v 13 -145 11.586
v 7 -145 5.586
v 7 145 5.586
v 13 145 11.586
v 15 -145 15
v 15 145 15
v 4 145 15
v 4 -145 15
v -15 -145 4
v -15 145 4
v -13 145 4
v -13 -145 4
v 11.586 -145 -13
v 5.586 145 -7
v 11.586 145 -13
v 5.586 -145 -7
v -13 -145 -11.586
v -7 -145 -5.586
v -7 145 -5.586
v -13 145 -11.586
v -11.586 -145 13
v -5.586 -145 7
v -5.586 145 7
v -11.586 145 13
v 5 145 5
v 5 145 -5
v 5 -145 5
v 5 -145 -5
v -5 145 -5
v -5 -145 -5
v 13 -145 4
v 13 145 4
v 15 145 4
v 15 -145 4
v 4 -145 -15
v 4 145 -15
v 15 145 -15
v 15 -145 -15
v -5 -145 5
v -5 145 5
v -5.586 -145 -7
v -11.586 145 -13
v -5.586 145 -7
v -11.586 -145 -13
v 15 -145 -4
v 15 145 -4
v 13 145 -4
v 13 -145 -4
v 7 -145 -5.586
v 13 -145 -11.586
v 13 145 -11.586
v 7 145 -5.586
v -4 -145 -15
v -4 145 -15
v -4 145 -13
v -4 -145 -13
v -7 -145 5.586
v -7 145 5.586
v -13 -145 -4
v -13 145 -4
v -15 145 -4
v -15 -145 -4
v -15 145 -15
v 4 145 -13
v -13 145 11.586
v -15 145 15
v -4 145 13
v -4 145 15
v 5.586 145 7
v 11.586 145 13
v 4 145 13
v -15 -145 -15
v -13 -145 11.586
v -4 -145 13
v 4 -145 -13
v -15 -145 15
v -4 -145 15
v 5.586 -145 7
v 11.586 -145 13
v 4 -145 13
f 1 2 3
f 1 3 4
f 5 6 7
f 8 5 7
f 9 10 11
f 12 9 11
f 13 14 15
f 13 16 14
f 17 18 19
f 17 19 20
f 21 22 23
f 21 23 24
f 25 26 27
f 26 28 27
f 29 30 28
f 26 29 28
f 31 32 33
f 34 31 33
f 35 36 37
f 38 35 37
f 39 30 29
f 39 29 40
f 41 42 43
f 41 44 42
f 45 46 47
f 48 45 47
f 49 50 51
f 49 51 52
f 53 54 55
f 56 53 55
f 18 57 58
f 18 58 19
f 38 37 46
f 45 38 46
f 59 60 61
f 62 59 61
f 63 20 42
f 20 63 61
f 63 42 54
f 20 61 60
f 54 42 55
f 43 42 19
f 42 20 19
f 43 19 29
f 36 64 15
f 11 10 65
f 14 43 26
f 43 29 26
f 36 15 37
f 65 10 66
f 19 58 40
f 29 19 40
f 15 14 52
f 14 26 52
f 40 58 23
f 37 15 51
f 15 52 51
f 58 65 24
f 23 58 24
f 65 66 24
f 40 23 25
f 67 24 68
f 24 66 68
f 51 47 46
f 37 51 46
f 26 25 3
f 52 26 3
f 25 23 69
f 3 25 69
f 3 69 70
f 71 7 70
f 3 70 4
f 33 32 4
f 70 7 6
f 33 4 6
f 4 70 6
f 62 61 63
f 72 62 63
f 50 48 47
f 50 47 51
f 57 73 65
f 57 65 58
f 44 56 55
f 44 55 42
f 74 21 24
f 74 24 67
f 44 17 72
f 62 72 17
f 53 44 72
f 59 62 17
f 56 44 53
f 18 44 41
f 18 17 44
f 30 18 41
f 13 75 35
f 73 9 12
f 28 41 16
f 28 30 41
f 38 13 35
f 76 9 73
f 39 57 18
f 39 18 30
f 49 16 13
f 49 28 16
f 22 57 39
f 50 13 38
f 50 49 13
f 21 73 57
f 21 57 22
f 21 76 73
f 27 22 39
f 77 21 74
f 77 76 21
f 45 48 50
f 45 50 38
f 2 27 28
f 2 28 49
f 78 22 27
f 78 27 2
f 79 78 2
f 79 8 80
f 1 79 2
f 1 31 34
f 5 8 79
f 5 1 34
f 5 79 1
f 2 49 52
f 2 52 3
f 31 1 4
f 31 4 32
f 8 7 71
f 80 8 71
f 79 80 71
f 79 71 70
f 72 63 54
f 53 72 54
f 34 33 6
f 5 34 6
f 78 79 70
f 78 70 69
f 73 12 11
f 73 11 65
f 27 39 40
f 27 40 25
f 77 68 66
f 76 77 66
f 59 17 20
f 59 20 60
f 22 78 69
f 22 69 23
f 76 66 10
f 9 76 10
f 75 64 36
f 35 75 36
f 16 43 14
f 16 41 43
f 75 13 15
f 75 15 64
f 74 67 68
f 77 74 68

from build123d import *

# Parameters (mm, degrees)
F0_W     = 10
F0_H     = 10
F1_DEPTH = 145


with BuildPart() as f1:
    # F0 (on Front) → F1 (new body, symmetric)
    with BuildSketch(Plane.XZ):
        Polygon((7, -5.585787), (7, -7), (5.585787, -7), (11.585786, -13), (4, -13), (4, -15), (15, -15), (15, -4), (13, -4), (13, -11.585786), align=None)
        Polygon((5.585787, -7), (7, -7), (7, -5.585787), (7, 5.585787), (7, 7), (5.585787, 7), (-5.585787, 7), (-7, 7), (-7, 5.585787), (-7, -5.585787), (-7, -7), (-5.585787, -7), align=None)
        Rectangle(F0_W, F0_H, mode=Mode.SUBTRACT)
        Polygon((-11.585786, -13), (-5.585787, -7), (-7, -7), (-7, -5.585787), (-13, -11.585786), (-13, -4), (-15, -4), (-15, -15), (-4, -15), (-4, -13), align=None)
        Polygon((7, 7), (7, 5.585787), (13, 11.585786), (13, 4), (15, 4), (15, 15), (4, 15), (4, 13), (11.585786, 13), (5.585787, 7), align=None)
        Polygon((-13, 11.585786), (-7, 5.585787), (-7, 7), (-5.585787, 7), (-11.585786, 13), (-4, 13), (-4, 15), (-15, 15), (-15, 4), (-13, 4), align=None)
    extrude(amount=F1_DEPTH, both=True)


solid = f1.part
